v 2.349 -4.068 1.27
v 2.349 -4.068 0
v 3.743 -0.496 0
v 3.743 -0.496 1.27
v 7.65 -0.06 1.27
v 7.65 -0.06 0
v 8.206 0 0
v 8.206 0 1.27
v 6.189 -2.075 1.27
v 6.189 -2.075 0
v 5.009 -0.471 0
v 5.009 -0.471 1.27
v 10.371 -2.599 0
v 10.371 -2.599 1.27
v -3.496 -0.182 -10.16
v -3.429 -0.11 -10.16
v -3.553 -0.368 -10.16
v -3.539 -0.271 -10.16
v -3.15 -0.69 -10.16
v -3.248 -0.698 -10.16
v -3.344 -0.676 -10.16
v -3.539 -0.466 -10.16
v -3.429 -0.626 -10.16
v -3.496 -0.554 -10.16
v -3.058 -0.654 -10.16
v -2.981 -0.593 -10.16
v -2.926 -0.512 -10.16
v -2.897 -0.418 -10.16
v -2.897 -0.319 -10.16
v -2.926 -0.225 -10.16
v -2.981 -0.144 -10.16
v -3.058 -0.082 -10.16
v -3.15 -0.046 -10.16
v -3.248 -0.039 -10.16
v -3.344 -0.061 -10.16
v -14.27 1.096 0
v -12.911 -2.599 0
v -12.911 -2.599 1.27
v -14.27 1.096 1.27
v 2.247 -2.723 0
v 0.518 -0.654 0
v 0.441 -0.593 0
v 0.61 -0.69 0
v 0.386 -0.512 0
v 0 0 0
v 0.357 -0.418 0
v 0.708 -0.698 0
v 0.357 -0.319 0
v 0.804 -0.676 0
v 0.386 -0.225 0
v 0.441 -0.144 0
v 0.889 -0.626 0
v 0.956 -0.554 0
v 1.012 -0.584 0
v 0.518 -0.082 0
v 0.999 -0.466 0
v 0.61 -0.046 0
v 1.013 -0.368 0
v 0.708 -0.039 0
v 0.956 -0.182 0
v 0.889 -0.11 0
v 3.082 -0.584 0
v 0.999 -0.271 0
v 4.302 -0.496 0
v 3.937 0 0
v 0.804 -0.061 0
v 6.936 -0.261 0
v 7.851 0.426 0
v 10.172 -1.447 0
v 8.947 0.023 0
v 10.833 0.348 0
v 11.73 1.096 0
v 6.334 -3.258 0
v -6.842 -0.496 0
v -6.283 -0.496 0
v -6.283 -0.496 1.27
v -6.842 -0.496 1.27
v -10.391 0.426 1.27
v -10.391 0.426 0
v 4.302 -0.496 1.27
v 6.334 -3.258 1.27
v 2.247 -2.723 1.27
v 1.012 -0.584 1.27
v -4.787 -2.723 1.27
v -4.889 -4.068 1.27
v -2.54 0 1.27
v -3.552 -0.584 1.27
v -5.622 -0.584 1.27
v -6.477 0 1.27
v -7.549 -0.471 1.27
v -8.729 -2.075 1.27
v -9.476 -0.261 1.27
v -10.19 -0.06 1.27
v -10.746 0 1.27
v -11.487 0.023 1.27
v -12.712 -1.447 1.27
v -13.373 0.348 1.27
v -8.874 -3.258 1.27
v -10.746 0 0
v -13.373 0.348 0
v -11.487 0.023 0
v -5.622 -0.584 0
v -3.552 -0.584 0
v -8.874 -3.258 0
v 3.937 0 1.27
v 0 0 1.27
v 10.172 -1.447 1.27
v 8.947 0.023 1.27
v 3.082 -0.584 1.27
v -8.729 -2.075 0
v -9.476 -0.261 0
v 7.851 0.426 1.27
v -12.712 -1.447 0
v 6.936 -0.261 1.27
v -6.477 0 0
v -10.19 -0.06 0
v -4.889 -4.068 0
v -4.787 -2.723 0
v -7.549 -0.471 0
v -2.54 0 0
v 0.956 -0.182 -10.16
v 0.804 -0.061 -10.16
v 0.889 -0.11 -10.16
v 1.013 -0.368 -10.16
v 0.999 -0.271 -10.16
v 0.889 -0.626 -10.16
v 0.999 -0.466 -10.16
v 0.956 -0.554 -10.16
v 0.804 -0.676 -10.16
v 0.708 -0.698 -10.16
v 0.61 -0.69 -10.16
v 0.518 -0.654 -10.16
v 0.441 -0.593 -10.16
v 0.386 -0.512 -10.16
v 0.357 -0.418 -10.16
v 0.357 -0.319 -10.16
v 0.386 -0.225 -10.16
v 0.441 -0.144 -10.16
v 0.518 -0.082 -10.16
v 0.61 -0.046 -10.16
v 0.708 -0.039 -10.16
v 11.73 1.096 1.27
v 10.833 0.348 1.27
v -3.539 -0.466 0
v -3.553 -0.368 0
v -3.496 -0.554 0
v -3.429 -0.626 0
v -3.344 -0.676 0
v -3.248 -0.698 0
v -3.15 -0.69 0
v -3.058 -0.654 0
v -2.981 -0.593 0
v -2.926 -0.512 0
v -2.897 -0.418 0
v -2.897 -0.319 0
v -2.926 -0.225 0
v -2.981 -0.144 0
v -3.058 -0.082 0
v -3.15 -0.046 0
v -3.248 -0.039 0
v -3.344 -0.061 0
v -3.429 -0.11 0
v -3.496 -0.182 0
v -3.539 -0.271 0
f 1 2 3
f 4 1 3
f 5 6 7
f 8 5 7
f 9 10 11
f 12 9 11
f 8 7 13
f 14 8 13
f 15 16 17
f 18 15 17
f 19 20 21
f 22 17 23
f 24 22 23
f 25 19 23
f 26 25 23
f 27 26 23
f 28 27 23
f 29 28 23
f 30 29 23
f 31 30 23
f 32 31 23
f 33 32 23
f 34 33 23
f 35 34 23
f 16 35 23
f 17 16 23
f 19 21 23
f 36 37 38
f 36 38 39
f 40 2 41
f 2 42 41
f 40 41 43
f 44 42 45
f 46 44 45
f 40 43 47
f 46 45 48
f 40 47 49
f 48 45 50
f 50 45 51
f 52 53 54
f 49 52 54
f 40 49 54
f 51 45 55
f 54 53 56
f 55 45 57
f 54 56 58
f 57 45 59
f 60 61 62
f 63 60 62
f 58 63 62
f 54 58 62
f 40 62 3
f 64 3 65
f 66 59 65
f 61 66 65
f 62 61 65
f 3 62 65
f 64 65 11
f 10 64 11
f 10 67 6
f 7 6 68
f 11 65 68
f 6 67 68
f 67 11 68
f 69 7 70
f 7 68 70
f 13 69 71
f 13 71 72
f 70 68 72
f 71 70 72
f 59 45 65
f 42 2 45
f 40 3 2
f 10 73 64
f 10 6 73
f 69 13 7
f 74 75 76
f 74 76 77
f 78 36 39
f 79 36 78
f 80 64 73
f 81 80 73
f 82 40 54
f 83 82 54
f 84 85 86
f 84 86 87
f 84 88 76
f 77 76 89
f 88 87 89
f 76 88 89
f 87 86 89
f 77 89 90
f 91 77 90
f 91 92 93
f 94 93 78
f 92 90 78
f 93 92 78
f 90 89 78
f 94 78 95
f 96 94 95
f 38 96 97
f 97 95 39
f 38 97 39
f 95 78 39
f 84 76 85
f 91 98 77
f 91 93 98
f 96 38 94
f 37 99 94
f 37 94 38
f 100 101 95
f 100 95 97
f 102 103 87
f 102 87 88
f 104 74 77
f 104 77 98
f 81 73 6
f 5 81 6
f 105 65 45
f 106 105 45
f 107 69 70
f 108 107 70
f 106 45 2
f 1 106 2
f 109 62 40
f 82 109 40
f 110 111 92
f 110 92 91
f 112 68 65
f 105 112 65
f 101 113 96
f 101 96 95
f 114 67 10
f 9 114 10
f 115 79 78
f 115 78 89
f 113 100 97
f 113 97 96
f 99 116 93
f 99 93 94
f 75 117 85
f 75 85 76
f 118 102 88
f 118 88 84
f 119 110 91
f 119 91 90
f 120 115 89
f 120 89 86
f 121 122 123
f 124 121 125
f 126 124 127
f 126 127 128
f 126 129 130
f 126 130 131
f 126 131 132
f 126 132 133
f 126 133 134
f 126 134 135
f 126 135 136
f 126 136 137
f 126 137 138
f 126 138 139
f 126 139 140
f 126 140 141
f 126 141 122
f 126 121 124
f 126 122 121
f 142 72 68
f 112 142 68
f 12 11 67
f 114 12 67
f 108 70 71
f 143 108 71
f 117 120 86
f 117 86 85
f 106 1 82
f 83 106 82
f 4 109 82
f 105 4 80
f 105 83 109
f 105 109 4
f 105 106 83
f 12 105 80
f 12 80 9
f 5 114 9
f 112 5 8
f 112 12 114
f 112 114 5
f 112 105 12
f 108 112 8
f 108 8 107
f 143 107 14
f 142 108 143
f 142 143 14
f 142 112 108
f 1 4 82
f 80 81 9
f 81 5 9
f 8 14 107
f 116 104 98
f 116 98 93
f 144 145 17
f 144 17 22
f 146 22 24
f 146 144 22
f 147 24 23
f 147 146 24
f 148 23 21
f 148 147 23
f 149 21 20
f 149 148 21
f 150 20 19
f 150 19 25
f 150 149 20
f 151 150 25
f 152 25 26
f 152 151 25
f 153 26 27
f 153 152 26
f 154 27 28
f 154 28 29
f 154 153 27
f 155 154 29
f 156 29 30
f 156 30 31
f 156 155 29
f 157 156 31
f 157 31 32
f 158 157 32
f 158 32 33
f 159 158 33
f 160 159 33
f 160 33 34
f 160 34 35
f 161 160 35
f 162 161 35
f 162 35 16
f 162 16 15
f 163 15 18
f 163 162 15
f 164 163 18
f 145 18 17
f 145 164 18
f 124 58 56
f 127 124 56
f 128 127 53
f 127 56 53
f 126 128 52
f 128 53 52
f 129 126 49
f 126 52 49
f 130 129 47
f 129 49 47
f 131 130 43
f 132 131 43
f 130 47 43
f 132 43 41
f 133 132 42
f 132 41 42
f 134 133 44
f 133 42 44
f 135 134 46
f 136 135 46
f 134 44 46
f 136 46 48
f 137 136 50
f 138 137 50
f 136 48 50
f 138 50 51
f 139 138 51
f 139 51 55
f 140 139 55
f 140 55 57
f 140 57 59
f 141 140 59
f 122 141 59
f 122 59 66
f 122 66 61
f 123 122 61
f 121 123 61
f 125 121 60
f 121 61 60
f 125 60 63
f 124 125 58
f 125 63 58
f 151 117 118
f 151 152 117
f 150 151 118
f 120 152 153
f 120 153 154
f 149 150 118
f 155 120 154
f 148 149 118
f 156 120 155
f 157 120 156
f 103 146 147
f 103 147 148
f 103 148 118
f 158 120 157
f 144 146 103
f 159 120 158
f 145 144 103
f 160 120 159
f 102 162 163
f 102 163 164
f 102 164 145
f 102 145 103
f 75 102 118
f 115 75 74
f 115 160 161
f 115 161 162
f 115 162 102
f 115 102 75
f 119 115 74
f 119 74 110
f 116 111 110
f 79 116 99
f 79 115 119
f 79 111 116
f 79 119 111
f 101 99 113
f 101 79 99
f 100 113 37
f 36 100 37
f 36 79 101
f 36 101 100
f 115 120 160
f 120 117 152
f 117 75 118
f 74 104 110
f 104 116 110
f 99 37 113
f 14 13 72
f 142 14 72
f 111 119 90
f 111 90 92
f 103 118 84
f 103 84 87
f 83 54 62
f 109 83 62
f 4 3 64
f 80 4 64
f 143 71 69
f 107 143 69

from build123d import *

# Parameters (mm, degrees)
F1_DEPTH = 1.27
F2_R     = 0.3302
F3_DEPTH = 10.16


with BuildPart() as f1:
    # F0 (on Top) → F1 (new body)
    with BuildSketch(Plane.XY):
        Polygon((3.937, 0), (0, 0), (2.348765, -4.06818), (3.743264, -0.496245), (4.302064, -0.496245), (6.333618, -3.257811), (7.650429, -0.060491), (8.205945, 0), (10.370969, -2.598556), (11.730417, 1.096288), (7.850865, 0.426183), align=None)
        Polygon((2.246752, -2.723089), (1.011864, -0.5842), (3.081783, -0.5842), align=None, mode=Mode.SUBTRACT)
        Polygon((6.188872, -2.07519), (5.008711, -0.470954), (6.936006, -0.26109), align=None, mode=Mode.SUBTRACT)
        Polygon((10.172099, -1.447205), (8.947399, 0.022734), (10.832753, 0.348386), align=None, mode=Mode.SUBTRACT)
    extrude(amount=F1_DEPTH)

    # F2 (on face) → F3 (join)
    with BuildSketch(Plane(origin=(0, 0, 0), x_dir=(1, 0, 0), z_dir=(0, 0, -1))):
        with Locations((0.683135, 0.368311)):
            Circle(F2_R)
    extrude(amount=F3_DEPTH)


with BuildPart() as f5_1:
    # F5: instance of F1
    add(f1.part.mirror(Plane.YZ.offset(-1.27)))


solid = Compound([f1.part, f5_1.part])
